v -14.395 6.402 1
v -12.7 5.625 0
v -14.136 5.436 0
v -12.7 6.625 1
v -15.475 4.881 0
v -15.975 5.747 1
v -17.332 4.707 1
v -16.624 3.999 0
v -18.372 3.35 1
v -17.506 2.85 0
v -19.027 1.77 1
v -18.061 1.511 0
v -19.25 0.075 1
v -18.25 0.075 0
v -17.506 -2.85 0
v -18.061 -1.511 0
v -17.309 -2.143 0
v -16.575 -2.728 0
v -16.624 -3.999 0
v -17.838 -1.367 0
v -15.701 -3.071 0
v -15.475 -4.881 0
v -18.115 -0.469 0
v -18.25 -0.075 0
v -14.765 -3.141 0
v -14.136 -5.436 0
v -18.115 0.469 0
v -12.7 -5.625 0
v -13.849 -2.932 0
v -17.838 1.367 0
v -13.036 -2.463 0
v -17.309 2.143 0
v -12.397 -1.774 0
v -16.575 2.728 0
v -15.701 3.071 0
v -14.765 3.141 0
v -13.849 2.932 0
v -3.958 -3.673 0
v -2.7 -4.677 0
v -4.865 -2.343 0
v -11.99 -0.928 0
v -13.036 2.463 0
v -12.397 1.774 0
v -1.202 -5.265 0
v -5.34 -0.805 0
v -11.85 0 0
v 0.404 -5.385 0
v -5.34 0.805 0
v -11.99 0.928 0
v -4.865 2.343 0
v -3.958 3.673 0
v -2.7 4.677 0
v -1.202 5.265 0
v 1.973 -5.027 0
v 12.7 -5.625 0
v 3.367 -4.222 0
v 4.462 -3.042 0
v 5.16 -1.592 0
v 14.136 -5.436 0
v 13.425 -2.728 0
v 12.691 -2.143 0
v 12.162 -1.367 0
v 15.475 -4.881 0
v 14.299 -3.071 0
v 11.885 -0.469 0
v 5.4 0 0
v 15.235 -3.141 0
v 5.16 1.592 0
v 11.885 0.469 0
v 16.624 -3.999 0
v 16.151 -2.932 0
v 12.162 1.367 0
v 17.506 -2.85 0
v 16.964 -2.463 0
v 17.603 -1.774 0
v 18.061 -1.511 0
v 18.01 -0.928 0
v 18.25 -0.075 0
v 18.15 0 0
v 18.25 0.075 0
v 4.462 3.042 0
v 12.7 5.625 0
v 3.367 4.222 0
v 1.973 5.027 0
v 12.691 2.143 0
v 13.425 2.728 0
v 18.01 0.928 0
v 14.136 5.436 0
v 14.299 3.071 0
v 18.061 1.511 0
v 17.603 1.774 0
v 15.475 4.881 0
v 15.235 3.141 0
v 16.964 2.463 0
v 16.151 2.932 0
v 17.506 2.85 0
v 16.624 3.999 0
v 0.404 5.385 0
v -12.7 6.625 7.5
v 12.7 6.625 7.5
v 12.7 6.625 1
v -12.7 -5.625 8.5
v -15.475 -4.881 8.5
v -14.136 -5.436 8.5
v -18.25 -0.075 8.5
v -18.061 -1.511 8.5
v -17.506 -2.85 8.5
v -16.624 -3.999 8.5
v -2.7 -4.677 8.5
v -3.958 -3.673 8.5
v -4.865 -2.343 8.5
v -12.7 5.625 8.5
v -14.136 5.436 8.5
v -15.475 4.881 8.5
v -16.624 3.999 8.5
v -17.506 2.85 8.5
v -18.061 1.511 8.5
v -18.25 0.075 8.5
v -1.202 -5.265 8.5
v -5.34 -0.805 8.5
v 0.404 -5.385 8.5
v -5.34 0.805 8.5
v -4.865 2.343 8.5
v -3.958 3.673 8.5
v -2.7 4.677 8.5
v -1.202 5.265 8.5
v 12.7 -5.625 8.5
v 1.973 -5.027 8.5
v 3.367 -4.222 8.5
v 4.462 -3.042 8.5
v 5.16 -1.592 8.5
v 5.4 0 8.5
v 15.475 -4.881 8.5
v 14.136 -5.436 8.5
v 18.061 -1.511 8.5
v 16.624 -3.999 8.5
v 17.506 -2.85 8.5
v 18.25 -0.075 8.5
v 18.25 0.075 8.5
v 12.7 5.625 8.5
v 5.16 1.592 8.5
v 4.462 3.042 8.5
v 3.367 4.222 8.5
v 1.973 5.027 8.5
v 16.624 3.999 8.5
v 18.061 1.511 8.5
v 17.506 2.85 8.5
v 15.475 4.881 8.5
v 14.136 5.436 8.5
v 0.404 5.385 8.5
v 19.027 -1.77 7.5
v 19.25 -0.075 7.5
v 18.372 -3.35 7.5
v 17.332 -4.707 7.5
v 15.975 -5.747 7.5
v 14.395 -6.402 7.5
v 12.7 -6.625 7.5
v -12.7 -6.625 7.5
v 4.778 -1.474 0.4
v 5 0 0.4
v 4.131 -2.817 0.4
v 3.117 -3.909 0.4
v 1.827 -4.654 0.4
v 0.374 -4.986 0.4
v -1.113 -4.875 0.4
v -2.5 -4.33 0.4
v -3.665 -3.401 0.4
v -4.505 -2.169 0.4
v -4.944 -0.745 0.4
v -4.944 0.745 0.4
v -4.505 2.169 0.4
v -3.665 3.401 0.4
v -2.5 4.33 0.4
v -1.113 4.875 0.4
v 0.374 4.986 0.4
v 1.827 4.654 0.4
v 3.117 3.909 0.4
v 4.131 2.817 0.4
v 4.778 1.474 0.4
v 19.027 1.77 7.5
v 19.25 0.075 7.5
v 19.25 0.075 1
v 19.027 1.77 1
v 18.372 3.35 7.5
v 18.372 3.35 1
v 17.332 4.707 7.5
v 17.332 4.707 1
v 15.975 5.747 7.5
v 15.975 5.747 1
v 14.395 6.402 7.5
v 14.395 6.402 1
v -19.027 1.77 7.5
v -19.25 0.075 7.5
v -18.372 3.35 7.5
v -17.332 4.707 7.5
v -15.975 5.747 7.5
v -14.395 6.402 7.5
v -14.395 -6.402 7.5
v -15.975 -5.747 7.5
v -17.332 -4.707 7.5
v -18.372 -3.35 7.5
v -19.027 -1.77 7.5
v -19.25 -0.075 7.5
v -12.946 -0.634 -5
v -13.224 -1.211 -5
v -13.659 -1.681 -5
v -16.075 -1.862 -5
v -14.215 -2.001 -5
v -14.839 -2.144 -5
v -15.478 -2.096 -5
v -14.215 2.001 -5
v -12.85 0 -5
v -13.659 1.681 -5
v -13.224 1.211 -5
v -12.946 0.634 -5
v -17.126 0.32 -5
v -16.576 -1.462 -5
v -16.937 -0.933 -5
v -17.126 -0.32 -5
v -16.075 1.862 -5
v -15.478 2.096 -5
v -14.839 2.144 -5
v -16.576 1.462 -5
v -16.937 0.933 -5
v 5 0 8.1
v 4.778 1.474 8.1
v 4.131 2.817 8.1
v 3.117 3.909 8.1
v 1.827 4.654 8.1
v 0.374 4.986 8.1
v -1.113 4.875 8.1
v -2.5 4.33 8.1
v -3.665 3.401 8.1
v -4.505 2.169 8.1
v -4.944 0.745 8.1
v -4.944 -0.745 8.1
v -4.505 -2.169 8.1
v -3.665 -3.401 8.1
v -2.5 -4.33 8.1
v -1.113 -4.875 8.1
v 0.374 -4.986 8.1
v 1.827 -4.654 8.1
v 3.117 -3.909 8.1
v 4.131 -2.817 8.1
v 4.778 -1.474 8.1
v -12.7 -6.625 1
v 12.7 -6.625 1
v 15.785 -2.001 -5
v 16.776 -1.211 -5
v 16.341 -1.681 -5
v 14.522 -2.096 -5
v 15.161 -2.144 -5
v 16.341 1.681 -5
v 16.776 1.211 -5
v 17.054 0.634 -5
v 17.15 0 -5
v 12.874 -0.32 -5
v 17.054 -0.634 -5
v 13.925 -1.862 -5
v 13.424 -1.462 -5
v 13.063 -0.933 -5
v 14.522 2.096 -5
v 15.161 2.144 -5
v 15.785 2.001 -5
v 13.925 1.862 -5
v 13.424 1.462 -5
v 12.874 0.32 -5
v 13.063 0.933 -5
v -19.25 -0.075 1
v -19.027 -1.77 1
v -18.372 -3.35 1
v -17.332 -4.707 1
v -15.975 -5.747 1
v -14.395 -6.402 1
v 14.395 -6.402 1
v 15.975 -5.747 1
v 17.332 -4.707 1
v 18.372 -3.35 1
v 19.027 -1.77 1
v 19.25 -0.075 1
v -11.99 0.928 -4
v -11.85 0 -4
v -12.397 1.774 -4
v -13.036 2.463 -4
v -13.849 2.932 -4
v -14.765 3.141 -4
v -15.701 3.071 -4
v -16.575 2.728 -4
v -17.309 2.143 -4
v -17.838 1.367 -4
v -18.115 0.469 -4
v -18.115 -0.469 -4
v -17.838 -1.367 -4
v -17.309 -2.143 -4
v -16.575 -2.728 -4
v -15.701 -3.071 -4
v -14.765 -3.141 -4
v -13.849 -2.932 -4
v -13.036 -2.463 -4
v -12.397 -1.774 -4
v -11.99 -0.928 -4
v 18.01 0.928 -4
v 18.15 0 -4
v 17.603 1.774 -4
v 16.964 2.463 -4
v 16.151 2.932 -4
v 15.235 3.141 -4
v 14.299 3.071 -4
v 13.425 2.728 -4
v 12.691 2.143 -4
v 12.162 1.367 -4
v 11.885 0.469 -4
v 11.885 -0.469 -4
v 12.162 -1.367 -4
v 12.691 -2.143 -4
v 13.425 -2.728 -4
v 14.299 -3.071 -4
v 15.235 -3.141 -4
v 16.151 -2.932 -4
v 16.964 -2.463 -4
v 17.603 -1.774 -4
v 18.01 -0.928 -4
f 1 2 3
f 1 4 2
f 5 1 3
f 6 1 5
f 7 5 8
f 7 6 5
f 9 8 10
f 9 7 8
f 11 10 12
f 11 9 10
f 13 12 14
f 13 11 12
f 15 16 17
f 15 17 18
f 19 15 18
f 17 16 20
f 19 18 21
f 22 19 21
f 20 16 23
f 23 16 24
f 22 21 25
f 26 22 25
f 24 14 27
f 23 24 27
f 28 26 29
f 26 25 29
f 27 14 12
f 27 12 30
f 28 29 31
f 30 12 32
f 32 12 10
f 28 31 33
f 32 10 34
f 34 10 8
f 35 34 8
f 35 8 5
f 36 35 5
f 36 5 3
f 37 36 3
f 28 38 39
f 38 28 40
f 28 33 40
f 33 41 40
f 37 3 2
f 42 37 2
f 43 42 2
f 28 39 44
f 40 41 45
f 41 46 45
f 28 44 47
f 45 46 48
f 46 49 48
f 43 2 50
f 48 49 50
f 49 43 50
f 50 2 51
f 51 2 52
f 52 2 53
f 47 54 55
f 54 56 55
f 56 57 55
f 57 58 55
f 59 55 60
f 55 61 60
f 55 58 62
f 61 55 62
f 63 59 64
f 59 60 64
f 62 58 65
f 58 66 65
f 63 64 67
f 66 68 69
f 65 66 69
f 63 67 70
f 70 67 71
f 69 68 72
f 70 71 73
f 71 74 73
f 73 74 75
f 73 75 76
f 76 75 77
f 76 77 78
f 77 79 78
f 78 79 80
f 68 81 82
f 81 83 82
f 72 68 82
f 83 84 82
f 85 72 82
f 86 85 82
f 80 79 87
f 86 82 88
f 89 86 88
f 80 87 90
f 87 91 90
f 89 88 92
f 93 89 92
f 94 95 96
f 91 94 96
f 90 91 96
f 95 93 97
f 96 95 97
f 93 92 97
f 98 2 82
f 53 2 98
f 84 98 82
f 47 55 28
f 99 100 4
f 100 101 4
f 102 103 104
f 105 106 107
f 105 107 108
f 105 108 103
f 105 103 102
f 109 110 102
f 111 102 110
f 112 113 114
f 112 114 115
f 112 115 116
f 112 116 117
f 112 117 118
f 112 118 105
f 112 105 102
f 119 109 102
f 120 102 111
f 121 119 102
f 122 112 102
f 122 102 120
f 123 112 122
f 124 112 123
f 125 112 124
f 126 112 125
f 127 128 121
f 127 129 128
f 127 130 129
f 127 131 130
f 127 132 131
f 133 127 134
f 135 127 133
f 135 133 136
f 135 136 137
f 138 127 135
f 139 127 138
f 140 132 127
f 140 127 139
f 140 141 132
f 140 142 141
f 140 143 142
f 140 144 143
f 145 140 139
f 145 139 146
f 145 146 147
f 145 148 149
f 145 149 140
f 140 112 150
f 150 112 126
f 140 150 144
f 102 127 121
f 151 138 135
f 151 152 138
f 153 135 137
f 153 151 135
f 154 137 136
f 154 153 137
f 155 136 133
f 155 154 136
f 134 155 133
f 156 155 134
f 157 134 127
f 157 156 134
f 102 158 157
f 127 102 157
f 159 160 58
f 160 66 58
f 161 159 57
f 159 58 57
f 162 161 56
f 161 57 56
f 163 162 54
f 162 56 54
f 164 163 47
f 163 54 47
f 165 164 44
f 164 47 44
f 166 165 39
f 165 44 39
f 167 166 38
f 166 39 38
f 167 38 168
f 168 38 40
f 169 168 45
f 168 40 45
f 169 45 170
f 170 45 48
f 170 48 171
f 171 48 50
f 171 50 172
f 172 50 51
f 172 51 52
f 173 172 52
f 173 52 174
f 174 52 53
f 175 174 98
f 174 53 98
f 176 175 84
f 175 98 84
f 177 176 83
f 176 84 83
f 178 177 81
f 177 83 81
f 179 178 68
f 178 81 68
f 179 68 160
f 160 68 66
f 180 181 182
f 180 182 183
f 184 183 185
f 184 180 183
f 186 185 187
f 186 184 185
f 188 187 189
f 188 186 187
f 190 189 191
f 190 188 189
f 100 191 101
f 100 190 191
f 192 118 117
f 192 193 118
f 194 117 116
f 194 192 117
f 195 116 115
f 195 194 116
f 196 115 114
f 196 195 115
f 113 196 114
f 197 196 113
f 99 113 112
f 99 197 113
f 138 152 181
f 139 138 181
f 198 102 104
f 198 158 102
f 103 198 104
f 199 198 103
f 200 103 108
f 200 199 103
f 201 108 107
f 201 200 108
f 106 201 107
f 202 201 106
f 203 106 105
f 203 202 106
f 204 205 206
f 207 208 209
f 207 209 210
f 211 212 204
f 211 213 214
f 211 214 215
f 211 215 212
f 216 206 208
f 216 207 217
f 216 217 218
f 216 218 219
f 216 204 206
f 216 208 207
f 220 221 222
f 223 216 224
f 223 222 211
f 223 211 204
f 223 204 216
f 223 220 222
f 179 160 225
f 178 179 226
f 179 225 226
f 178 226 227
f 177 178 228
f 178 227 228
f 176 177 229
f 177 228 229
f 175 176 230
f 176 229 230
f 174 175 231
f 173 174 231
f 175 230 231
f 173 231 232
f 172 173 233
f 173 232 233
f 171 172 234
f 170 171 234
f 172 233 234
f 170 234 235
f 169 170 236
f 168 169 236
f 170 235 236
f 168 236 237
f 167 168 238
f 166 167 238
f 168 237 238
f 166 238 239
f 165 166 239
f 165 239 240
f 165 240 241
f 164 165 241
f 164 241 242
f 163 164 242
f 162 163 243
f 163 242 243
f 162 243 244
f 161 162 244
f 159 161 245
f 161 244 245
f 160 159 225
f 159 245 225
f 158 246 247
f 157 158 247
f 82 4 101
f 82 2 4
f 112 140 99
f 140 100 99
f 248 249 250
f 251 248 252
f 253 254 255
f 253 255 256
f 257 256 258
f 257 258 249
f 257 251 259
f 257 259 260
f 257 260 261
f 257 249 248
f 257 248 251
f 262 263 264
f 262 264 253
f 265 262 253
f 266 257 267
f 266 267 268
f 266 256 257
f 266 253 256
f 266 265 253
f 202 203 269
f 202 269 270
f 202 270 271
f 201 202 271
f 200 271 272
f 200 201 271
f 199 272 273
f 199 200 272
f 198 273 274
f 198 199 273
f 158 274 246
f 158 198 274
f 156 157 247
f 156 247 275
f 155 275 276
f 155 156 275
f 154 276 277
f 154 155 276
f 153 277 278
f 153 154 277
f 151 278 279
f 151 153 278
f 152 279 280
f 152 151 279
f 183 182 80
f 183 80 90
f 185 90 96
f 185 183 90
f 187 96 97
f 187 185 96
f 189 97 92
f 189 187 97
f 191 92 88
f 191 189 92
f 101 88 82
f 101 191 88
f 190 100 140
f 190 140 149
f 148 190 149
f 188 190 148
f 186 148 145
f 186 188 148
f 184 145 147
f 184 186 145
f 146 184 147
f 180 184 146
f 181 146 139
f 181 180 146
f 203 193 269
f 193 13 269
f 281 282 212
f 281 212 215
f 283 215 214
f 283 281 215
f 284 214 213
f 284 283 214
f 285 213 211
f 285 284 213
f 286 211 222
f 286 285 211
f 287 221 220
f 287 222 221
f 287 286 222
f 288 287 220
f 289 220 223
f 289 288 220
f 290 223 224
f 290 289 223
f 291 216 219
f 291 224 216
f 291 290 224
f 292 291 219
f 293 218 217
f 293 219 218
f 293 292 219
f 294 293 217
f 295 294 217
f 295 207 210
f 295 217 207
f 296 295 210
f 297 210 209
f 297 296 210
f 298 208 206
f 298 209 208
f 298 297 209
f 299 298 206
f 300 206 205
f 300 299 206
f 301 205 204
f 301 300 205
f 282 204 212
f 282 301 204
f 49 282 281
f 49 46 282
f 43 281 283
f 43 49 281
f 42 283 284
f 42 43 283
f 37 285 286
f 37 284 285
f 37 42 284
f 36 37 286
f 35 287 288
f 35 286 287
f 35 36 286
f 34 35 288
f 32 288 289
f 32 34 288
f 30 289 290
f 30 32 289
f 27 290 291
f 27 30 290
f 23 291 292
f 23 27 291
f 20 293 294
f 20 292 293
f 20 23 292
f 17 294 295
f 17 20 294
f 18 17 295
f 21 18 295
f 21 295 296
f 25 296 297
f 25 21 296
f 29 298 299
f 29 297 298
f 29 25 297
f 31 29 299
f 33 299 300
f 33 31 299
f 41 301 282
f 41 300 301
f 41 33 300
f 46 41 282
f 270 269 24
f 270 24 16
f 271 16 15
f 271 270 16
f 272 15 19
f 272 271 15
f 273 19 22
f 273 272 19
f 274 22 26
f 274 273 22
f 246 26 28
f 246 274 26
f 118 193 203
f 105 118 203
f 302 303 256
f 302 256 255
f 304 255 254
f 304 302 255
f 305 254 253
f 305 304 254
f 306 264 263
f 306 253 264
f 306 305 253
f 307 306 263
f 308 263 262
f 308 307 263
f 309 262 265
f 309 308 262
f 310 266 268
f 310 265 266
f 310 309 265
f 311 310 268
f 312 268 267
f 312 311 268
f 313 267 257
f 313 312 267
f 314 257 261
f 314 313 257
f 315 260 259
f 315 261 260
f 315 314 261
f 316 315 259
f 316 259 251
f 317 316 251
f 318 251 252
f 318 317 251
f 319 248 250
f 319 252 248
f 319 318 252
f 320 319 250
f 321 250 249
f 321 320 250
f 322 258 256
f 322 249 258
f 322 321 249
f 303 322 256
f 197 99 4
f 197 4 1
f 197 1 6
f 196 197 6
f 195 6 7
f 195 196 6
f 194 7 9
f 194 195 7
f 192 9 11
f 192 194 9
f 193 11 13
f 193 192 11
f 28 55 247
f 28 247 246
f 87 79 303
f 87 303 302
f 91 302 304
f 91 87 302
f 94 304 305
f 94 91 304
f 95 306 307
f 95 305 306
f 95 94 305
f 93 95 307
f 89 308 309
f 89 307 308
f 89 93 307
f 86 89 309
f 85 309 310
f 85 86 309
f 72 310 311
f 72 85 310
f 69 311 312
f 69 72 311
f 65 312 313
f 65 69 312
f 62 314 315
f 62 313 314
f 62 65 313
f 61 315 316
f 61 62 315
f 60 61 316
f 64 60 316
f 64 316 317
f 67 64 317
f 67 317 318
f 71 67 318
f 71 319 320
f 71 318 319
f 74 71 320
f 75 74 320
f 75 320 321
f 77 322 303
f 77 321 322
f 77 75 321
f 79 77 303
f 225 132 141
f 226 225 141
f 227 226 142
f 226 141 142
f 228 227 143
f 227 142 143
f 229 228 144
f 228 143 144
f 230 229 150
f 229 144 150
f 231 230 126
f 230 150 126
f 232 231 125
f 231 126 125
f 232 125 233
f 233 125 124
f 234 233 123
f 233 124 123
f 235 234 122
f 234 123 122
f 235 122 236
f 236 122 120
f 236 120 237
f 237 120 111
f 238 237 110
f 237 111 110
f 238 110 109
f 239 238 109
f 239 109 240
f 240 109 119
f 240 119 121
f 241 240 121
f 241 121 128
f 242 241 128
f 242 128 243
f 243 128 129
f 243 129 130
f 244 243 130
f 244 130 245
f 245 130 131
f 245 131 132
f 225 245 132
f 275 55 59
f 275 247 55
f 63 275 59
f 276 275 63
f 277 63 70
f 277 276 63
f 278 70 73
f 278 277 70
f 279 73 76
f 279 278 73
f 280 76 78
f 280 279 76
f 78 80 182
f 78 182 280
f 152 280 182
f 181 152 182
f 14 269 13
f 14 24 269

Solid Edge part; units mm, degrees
sketch "Sketch1" plane through (0, 0, 0) normal (0, 0, 1) x (1, 0, 0)
  line L0 (-19.25, -6.625) -> (19.25, -6.625)
  line L1 (19.25, -6.625) -> (19.25, 6.625)
  line L2 (19.25, 6.625) -> (-19.25, 6.625)
  line L3 (-19.25, 6.625) -> (-19.25, -6.625)
  dimension "D1" = 38.5
  dimension "D2" = 13.25
extrude "Protrusion1" add sketch "Sketch1" along normal blind 8.5
sketch "Sketch2" plane through (0, 0, 0) normal (0, 0, -1) x (1, 0, 0)
  circle A0 centre (-15, 0) radius 3.15
  circle A1 centre (15, 0) radius 3.15
  dimension "D1" = 6.3
  dimension "D2" = 6.3
extrude "Extrusionsausprägung_2" add sketch "Sketch2" along normal blind 5
fillet "Verrundung_1" radius 6.55 4 edges at (19.25, -6.625, 4.25) (19.25, 6.625, 4.25) (-19.25, -6.625, 4.25) (-19.25, 6.625, 4.25)
sketch "Sketch3" plane through (0, 0, 8.5) normal (0, 0, 1) x (1, 0, 0)
  circle A0 centre (0, 0) radius 5
  dimension "D1" = 10
extrude "Extrusionsausschnitt_2" cut sketch "Sketch3" against normal blind 199.2649
chamfer "Fase_2" distance 1 angle 45 16 edges at (0, 6.625, 8.5) (-17.3315, 4.7065, 8.5) (-19.25, 0, 8.5) (-17.3315, -4.7065, 8.5) (0, -6.625, 8.5) (17.3315, -4.7065, 8.5) (19.25, 0, 8.5) (0, -6.625, 0) (17.3315, -4.7065, 0) (19.25, 0, 0) (0, 6.625, 0) (-17.3315, 4.7065, 0) (-19.25, 0, 0) (-17.3315, -4.7065, 0) (-18.15, 0, -5) (11.85, 0, -5)
chamfer "Fase_3" distance 0.4 angle 45 2 edges at (-5, 0, 0) (-5, 0, 8.5)
